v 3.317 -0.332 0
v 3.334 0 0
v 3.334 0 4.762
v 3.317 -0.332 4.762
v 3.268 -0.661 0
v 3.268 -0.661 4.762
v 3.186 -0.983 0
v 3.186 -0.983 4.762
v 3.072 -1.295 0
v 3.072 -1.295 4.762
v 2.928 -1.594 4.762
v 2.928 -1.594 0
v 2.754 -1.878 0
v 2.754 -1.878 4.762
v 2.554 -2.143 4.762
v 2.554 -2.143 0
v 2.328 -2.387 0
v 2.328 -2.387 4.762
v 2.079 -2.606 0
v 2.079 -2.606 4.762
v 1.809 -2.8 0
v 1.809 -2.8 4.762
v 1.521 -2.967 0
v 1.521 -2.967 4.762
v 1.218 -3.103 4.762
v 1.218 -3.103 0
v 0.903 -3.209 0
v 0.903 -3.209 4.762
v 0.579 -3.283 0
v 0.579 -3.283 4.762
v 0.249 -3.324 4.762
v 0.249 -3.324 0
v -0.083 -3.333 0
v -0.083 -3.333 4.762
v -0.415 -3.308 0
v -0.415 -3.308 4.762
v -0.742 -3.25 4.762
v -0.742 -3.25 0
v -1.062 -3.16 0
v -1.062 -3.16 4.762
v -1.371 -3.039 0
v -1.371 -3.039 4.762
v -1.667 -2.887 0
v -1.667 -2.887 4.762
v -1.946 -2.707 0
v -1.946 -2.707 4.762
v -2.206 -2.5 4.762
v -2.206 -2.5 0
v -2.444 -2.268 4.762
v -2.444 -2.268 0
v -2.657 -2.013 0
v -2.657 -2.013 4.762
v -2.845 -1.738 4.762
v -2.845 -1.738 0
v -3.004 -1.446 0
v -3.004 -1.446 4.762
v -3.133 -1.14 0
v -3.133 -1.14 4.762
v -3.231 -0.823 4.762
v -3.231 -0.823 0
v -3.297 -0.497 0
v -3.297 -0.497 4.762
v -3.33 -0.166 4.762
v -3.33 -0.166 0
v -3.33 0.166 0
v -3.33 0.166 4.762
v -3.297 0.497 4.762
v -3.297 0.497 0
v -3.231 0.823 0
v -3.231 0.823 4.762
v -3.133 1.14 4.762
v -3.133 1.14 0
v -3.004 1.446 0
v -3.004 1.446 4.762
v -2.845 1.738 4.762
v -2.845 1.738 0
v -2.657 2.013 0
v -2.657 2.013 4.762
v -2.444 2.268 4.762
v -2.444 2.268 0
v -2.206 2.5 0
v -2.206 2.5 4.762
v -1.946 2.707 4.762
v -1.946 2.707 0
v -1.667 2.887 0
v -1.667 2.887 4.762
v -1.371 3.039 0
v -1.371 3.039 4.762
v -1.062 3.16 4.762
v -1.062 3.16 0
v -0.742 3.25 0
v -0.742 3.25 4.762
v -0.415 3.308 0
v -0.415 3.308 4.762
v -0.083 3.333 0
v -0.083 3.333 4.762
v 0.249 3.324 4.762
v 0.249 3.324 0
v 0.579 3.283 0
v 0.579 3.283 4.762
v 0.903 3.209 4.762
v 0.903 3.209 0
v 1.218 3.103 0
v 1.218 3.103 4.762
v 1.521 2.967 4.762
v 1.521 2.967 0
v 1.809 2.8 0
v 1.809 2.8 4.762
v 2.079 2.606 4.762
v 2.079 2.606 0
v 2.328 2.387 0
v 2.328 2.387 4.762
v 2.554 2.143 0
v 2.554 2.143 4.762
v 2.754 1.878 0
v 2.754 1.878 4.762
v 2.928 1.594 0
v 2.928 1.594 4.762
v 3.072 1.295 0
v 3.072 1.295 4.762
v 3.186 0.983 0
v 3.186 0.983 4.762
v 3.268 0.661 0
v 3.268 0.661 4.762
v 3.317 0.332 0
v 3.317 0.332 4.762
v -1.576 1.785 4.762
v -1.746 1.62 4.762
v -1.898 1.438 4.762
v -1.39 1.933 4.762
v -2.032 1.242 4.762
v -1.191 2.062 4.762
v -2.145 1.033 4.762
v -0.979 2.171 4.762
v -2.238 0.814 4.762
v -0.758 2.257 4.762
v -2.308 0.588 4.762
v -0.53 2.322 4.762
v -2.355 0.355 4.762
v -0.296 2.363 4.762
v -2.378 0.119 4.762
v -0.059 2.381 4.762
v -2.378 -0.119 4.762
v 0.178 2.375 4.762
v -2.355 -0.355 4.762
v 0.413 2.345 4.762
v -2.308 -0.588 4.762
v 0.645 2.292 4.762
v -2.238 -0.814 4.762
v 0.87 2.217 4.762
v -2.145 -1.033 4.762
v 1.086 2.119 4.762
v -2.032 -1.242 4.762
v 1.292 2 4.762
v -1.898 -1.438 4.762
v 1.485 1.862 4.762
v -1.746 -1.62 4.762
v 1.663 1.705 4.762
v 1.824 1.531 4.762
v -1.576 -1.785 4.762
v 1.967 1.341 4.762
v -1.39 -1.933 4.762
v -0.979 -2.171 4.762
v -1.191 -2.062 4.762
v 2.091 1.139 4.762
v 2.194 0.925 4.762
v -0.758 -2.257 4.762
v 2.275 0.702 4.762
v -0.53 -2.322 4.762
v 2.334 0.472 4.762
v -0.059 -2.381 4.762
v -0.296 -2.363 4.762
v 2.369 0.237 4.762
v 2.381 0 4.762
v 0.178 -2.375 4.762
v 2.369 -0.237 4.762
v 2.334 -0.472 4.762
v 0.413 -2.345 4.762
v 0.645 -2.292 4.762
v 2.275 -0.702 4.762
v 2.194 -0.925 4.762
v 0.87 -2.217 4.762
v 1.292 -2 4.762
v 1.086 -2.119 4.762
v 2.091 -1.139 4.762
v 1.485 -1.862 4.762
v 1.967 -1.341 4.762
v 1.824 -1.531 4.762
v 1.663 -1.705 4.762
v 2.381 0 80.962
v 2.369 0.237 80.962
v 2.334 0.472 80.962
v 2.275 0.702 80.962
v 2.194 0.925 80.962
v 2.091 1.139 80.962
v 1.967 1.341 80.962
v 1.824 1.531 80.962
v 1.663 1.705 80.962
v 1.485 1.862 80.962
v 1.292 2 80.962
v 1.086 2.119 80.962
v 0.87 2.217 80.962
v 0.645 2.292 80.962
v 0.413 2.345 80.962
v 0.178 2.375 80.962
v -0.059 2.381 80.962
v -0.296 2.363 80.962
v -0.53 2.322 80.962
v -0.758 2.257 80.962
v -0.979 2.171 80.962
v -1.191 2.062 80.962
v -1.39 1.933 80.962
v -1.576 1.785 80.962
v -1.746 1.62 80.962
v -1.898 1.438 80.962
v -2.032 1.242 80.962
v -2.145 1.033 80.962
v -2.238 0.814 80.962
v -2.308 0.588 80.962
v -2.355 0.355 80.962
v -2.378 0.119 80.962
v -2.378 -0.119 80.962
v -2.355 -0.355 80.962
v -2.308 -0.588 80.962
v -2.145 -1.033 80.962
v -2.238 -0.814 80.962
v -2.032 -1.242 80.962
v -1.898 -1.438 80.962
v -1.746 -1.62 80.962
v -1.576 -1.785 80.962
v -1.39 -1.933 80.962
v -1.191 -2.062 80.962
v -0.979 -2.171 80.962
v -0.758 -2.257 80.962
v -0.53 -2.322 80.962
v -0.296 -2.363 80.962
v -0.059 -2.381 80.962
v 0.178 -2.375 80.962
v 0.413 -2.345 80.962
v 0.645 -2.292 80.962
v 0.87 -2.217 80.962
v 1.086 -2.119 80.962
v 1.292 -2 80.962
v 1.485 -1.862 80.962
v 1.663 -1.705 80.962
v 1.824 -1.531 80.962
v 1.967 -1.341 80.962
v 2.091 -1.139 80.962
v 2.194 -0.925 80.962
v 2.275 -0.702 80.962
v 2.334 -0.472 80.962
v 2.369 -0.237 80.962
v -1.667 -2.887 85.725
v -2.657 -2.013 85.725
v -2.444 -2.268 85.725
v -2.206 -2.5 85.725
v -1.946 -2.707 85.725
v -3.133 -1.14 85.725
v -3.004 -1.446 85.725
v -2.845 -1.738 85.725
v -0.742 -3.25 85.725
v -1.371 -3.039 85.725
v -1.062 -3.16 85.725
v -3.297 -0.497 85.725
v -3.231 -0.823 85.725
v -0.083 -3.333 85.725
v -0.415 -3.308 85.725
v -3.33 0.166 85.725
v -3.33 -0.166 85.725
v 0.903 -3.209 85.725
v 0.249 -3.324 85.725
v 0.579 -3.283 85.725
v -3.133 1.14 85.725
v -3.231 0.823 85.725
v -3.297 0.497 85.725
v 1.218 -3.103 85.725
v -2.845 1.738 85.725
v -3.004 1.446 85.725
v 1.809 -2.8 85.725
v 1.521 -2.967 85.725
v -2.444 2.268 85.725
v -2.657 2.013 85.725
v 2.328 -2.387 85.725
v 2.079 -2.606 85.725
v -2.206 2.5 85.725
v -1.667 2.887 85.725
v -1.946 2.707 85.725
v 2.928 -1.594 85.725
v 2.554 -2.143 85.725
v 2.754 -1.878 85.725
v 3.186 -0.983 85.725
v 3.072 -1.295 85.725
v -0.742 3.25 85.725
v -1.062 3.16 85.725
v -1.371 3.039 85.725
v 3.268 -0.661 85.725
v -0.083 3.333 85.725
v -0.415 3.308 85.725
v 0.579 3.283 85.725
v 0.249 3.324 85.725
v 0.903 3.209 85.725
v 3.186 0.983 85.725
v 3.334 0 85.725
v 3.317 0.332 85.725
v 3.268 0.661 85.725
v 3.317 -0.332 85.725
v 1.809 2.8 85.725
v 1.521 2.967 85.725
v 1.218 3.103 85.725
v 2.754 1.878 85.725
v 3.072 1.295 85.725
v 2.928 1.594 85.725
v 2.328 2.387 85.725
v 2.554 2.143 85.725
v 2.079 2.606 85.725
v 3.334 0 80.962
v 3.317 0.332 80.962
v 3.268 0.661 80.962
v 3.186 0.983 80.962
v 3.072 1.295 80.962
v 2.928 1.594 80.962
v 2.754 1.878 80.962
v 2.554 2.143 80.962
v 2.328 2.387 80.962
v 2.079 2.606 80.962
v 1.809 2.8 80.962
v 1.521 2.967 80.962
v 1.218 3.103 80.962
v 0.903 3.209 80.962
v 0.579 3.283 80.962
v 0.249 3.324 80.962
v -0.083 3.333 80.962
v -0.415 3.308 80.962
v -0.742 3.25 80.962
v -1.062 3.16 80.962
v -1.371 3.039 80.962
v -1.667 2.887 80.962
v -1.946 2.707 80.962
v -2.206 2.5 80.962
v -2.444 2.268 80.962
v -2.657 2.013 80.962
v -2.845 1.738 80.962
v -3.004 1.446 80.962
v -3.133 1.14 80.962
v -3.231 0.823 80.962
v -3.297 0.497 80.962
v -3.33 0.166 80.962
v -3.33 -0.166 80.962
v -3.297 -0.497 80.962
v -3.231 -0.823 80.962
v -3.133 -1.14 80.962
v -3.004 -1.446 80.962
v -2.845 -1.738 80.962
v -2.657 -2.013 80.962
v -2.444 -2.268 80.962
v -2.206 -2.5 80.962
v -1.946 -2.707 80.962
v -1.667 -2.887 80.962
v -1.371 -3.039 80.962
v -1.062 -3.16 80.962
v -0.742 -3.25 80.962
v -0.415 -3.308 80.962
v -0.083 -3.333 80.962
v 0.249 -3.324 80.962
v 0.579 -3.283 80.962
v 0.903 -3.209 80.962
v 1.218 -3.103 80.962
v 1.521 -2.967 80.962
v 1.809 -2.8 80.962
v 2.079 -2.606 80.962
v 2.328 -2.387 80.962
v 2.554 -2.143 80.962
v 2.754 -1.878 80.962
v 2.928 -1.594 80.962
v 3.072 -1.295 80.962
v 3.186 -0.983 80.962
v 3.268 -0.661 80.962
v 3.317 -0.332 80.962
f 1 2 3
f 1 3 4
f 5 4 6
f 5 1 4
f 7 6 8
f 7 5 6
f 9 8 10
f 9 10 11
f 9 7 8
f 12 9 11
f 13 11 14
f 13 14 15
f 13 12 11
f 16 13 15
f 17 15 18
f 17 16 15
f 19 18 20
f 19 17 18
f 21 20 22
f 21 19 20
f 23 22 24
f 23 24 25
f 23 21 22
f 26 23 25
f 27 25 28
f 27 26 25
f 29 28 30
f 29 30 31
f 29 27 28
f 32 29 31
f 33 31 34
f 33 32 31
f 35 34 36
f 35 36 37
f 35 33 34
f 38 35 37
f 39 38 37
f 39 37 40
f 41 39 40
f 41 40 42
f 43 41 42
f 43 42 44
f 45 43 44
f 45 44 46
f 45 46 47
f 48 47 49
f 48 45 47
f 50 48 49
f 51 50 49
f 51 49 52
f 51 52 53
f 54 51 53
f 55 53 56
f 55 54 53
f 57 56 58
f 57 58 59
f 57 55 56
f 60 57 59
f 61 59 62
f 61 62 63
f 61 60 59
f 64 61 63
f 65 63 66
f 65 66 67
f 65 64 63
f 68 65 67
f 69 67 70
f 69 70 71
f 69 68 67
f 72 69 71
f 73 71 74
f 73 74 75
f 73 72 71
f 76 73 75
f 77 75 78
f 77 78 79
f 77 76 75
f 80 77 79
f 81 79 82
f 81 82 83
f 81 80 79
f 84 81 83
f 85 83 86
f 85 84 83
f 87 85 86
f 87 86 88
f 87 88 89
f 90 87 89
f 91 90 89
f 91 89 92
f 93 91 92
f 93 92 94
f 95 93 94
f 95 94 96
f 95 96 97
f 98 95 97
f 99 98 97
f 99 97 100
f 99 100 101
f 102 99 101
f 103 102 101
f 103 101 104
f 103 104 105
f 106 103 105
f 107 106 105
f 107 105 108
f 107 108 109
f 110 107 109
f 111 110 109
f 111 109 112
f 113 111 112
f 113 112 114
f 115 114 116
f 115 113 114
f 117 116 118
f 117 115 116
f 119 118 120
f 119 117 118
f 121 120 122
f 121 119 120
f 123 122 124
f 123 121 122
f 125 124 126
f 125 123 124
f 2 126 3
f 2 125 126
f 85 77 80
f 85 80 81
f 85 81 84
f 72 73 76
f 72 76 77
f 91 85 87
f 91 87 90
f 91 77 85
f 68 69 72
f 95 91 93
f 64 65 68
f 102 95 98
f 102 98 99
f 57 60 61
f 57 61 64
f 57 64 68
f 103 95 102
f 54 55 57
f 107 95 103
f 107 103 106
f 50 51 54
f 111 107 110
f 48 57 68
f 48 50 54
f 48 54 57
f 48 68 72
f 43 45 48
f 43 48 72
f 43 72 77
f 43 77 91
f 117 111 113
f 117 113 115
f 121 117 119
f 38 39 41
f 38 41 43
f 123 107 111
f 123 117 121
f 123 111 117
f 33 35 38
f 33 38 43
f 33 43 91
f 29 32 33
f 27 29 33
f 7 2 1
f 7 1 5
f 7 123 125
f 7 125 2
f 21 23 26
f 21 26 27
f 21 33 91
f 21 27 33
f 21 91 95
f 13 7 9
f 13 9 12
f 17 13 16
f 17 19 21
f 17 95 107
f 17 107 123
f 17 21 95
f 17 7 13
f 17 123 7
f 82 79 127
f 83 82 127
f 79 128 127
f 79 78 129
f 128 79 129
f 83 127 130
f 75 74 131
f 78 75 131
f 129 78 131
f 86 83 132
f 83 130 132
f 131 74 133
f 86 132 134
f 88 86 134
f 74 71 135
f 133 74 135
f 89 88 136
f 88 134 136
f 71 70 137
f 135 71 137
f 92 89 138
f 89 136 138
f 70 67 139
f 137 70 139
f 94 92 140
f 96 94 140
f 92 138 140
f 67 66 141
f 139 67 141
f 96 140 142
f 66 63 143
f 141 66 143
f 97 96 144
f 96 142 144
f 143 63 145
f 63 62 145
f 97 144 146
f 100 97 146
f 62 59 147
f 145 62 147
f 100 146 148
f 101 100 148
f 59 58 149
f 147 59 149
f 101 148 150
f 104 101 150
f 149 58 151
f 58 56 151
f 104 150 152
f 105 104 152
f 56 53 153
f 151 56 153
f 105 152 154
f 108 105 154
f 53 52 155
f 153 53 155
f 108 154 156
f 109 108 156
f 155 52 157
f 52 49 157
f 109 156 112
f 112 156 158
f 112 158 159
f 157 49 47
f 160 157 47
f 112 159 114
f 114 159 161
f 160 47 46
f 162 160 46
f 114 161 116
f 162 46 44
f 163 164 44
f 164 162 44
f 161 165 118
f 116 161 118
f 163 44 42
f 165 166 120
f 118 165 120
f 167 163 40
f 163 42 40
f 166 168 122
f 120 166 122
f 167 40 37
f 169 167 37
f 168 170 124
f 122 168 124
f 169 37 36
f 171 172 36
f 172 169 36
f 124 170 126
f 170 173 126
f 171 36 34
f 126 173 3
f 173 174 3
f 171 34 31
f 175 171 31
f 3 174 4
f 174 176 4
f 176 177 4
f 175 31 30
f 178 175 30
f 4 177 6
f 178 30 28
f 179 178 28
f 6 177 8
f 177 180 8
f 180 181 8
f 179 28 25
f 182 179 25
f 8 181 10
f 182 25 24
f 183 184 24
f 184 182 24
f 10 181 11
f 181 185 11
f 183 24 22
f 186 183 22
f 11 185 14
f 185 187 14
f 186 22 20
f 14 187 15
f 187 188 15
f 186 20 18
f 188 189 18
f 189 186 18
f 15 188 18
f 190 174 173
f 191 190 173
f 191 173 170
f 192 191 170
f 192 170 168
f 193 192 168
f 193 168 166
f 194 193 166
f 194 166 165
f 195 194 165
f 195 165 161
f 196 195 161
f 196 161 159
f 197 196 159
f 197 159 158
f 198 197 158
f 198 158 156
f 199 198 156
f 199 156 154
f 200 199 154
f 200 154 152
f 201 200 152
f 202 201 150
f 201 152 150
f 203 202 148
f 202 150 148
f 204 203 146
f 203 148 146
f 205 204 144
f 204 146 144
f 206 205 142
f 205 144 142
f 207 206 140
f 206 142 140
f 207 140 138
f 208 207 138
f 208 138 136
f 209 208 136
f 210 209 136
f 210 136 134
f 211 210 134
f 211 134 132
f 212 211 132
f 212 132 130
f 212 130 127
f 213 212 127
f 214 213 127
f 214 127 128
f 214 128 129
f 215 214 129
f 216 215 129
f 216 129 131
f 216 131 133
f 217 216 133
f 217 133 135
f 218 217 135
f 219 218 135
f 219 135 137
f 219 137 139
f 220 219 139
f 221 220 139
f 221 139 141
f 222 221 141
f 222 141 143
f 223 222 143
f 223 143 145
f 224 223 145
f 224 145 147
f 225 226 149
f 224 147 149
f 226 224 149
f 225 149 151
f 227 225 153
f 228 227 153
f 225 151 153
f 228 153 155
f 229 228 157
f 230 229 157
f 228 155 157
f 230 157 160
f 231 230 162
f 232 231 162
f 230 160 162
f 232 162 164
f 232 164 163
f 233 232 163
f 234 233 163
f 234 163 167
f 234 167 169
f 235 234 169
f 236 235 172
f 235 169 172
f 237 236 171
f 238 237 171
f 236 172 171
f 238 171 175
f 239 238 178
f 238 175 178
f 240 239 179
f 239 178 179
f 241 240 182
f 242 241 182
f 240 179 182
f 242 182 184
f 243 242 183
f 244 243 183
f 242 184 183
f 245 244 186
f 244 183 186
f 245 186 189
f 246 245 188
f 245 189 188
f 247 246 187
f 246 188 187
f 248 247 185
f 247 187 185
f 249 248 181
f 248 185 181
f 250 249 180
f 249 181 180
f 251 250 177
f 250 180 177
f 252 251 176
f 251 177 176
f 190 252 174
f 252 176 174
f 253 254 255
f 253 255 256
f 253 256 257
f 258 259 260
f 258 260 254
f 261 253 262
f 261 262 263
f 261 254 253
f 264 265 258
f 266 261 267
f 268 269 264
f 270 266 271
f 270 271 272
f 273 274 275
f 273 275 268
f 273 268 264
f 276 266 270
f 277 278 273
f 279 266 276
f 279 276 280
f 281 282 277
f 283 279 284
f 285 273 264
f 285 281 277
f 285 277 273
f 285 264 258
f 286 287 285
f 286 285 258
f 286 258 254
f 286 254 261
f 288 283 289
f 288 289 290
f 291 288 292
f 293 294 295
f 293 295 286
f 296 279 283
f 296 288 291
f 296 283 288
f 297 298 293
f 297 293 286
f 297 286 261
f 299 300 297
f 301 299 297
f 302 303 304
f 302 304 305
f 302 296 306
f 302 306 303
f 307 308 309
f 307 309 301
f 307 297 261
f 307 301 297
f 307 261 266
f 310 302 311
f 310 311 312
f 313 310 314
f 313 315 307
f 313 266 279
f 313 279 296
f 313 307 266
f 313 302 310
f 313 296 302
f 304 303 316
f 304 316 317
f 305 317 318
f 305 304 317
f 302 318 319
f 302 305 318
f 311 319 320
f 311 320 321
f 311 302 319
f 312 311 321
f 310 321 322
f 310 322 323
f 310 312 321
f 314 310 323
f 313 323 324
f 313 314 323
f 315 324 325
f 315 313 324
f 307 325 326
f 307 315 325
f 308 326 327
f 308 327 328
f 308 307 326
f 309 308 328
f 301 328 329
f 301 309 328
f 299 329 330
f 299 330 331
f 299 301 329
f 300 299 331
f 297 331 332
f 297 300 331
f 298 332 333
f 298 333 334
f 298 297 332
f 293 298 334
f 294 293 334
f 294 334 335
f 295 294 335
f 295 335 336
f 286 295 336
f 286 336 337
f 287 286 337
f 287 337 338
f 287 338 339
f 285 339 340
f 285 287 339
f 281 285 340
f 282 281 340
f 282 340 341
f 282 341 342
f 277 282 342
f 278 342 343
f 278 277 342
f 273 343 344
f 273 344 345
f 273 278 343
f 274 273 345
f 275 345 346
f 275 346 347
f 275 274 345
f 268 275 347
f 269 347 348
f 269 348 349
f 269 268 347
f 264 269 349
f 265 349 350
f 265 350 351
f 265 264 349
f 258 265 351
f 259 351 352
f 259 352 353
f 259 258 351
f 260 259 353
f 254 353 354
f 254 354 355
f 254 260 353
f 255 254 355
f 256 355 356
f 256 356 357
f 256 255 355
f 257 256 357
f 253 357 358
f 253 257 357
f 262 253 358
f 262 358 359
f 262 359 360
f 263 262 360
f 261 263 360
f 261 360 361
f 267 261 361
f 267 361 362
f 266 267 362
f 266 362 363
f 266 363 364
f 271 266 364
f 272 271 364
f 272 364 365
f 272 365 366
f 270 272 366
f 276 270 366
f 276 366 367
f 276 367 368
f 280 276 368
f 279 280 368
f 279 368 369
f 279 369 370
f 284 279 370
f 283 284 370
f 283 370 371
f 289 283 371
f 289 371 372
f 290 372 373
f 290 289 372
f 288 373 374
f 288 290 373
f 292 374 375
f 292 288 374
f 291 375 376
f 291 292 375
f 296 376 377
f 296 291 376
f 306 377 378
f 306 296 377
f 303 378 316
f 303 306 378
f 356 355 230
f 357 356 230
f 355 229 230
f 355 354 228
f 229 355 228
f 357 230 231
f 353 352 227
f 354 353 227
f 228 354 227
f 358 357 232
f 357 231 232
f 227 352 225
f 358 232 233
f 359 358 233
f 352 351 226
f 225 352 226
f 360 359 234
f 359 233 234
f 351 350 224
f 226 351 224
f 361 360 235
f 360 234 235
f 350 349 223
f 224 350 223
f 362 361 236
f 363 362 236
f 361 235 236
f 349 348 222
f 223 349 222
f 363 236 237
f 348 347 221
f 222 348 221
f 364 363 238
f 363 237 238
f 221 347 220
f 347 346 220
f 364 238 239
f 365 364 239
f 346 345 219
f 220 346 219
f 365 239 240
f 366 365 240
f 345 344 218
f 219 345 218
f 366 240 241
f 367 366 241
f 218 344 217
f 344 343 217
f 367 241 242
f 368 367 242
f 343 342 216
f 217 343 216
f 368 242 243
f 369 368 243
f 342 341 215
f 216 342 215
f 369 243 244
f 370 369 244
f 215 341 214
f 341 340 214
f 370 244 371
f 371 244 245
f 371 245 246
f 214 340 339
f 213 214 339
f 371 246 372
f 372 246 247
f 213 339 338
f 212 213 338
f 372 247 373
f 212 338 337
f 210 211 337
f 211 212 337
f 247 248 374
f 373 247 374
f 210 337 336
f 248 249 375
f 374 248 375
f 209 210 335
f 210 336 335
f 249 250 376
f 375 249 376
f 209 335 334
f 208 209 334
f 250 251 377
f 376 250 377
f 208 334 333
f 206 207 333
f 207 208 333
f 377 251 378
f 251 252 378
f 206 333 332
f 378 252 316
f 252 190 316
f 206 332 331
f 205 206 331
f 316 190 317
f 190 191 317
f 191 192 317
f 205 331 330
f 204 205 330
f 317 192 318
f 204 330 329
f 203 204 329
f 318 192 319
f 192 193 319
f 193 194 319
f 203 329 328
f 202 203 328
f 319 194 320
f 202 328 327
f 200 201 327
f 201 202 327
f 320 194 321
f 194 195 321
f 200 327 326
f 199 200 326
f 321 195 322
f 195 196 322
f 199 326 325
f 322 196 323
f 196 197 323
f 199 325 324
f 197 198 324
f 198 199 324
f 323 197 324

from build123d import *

# Parameters (mm, degrees)
F0_R     = 2.38125
F1_DEPTH = 85.725
F2_R     = 3.33375
F2_R_2   = 2.38125
F3_DEPTH = 4.7625
F4_R     = 3.33375
F4_R_2   = 2.38125
F5_DEPTH = 4.7625


with BuildPart() as f1:
    # F0 (on Top) → F1 (new body)
    with BuildSketch(Plane.XY):
        Circle(F0_R)
    extrude(amount=F1_DEPTH)

    # F2 (on face) → F3 (join)
    with BuildSketch(Plane(origin=(0, 0, 0), x_dir=(1, 0, 0), z_dir=(0, 0, -1))):
        Circle(F2_R)
        Circle(F2_R_2, mode=Mode.SUBTRACT)
    extrude(amount=-F3_DEPTH)

    # F4 (on face) → F5 (join)
    with BuildSketch(Plane.XY.offset(85.725)):
        Circle(F4_R)
        Circle(F4_R_2, mode=Mode.SUBTRACT)
    extrude(amount=-F5_DEPTH)


solid = f1.part
